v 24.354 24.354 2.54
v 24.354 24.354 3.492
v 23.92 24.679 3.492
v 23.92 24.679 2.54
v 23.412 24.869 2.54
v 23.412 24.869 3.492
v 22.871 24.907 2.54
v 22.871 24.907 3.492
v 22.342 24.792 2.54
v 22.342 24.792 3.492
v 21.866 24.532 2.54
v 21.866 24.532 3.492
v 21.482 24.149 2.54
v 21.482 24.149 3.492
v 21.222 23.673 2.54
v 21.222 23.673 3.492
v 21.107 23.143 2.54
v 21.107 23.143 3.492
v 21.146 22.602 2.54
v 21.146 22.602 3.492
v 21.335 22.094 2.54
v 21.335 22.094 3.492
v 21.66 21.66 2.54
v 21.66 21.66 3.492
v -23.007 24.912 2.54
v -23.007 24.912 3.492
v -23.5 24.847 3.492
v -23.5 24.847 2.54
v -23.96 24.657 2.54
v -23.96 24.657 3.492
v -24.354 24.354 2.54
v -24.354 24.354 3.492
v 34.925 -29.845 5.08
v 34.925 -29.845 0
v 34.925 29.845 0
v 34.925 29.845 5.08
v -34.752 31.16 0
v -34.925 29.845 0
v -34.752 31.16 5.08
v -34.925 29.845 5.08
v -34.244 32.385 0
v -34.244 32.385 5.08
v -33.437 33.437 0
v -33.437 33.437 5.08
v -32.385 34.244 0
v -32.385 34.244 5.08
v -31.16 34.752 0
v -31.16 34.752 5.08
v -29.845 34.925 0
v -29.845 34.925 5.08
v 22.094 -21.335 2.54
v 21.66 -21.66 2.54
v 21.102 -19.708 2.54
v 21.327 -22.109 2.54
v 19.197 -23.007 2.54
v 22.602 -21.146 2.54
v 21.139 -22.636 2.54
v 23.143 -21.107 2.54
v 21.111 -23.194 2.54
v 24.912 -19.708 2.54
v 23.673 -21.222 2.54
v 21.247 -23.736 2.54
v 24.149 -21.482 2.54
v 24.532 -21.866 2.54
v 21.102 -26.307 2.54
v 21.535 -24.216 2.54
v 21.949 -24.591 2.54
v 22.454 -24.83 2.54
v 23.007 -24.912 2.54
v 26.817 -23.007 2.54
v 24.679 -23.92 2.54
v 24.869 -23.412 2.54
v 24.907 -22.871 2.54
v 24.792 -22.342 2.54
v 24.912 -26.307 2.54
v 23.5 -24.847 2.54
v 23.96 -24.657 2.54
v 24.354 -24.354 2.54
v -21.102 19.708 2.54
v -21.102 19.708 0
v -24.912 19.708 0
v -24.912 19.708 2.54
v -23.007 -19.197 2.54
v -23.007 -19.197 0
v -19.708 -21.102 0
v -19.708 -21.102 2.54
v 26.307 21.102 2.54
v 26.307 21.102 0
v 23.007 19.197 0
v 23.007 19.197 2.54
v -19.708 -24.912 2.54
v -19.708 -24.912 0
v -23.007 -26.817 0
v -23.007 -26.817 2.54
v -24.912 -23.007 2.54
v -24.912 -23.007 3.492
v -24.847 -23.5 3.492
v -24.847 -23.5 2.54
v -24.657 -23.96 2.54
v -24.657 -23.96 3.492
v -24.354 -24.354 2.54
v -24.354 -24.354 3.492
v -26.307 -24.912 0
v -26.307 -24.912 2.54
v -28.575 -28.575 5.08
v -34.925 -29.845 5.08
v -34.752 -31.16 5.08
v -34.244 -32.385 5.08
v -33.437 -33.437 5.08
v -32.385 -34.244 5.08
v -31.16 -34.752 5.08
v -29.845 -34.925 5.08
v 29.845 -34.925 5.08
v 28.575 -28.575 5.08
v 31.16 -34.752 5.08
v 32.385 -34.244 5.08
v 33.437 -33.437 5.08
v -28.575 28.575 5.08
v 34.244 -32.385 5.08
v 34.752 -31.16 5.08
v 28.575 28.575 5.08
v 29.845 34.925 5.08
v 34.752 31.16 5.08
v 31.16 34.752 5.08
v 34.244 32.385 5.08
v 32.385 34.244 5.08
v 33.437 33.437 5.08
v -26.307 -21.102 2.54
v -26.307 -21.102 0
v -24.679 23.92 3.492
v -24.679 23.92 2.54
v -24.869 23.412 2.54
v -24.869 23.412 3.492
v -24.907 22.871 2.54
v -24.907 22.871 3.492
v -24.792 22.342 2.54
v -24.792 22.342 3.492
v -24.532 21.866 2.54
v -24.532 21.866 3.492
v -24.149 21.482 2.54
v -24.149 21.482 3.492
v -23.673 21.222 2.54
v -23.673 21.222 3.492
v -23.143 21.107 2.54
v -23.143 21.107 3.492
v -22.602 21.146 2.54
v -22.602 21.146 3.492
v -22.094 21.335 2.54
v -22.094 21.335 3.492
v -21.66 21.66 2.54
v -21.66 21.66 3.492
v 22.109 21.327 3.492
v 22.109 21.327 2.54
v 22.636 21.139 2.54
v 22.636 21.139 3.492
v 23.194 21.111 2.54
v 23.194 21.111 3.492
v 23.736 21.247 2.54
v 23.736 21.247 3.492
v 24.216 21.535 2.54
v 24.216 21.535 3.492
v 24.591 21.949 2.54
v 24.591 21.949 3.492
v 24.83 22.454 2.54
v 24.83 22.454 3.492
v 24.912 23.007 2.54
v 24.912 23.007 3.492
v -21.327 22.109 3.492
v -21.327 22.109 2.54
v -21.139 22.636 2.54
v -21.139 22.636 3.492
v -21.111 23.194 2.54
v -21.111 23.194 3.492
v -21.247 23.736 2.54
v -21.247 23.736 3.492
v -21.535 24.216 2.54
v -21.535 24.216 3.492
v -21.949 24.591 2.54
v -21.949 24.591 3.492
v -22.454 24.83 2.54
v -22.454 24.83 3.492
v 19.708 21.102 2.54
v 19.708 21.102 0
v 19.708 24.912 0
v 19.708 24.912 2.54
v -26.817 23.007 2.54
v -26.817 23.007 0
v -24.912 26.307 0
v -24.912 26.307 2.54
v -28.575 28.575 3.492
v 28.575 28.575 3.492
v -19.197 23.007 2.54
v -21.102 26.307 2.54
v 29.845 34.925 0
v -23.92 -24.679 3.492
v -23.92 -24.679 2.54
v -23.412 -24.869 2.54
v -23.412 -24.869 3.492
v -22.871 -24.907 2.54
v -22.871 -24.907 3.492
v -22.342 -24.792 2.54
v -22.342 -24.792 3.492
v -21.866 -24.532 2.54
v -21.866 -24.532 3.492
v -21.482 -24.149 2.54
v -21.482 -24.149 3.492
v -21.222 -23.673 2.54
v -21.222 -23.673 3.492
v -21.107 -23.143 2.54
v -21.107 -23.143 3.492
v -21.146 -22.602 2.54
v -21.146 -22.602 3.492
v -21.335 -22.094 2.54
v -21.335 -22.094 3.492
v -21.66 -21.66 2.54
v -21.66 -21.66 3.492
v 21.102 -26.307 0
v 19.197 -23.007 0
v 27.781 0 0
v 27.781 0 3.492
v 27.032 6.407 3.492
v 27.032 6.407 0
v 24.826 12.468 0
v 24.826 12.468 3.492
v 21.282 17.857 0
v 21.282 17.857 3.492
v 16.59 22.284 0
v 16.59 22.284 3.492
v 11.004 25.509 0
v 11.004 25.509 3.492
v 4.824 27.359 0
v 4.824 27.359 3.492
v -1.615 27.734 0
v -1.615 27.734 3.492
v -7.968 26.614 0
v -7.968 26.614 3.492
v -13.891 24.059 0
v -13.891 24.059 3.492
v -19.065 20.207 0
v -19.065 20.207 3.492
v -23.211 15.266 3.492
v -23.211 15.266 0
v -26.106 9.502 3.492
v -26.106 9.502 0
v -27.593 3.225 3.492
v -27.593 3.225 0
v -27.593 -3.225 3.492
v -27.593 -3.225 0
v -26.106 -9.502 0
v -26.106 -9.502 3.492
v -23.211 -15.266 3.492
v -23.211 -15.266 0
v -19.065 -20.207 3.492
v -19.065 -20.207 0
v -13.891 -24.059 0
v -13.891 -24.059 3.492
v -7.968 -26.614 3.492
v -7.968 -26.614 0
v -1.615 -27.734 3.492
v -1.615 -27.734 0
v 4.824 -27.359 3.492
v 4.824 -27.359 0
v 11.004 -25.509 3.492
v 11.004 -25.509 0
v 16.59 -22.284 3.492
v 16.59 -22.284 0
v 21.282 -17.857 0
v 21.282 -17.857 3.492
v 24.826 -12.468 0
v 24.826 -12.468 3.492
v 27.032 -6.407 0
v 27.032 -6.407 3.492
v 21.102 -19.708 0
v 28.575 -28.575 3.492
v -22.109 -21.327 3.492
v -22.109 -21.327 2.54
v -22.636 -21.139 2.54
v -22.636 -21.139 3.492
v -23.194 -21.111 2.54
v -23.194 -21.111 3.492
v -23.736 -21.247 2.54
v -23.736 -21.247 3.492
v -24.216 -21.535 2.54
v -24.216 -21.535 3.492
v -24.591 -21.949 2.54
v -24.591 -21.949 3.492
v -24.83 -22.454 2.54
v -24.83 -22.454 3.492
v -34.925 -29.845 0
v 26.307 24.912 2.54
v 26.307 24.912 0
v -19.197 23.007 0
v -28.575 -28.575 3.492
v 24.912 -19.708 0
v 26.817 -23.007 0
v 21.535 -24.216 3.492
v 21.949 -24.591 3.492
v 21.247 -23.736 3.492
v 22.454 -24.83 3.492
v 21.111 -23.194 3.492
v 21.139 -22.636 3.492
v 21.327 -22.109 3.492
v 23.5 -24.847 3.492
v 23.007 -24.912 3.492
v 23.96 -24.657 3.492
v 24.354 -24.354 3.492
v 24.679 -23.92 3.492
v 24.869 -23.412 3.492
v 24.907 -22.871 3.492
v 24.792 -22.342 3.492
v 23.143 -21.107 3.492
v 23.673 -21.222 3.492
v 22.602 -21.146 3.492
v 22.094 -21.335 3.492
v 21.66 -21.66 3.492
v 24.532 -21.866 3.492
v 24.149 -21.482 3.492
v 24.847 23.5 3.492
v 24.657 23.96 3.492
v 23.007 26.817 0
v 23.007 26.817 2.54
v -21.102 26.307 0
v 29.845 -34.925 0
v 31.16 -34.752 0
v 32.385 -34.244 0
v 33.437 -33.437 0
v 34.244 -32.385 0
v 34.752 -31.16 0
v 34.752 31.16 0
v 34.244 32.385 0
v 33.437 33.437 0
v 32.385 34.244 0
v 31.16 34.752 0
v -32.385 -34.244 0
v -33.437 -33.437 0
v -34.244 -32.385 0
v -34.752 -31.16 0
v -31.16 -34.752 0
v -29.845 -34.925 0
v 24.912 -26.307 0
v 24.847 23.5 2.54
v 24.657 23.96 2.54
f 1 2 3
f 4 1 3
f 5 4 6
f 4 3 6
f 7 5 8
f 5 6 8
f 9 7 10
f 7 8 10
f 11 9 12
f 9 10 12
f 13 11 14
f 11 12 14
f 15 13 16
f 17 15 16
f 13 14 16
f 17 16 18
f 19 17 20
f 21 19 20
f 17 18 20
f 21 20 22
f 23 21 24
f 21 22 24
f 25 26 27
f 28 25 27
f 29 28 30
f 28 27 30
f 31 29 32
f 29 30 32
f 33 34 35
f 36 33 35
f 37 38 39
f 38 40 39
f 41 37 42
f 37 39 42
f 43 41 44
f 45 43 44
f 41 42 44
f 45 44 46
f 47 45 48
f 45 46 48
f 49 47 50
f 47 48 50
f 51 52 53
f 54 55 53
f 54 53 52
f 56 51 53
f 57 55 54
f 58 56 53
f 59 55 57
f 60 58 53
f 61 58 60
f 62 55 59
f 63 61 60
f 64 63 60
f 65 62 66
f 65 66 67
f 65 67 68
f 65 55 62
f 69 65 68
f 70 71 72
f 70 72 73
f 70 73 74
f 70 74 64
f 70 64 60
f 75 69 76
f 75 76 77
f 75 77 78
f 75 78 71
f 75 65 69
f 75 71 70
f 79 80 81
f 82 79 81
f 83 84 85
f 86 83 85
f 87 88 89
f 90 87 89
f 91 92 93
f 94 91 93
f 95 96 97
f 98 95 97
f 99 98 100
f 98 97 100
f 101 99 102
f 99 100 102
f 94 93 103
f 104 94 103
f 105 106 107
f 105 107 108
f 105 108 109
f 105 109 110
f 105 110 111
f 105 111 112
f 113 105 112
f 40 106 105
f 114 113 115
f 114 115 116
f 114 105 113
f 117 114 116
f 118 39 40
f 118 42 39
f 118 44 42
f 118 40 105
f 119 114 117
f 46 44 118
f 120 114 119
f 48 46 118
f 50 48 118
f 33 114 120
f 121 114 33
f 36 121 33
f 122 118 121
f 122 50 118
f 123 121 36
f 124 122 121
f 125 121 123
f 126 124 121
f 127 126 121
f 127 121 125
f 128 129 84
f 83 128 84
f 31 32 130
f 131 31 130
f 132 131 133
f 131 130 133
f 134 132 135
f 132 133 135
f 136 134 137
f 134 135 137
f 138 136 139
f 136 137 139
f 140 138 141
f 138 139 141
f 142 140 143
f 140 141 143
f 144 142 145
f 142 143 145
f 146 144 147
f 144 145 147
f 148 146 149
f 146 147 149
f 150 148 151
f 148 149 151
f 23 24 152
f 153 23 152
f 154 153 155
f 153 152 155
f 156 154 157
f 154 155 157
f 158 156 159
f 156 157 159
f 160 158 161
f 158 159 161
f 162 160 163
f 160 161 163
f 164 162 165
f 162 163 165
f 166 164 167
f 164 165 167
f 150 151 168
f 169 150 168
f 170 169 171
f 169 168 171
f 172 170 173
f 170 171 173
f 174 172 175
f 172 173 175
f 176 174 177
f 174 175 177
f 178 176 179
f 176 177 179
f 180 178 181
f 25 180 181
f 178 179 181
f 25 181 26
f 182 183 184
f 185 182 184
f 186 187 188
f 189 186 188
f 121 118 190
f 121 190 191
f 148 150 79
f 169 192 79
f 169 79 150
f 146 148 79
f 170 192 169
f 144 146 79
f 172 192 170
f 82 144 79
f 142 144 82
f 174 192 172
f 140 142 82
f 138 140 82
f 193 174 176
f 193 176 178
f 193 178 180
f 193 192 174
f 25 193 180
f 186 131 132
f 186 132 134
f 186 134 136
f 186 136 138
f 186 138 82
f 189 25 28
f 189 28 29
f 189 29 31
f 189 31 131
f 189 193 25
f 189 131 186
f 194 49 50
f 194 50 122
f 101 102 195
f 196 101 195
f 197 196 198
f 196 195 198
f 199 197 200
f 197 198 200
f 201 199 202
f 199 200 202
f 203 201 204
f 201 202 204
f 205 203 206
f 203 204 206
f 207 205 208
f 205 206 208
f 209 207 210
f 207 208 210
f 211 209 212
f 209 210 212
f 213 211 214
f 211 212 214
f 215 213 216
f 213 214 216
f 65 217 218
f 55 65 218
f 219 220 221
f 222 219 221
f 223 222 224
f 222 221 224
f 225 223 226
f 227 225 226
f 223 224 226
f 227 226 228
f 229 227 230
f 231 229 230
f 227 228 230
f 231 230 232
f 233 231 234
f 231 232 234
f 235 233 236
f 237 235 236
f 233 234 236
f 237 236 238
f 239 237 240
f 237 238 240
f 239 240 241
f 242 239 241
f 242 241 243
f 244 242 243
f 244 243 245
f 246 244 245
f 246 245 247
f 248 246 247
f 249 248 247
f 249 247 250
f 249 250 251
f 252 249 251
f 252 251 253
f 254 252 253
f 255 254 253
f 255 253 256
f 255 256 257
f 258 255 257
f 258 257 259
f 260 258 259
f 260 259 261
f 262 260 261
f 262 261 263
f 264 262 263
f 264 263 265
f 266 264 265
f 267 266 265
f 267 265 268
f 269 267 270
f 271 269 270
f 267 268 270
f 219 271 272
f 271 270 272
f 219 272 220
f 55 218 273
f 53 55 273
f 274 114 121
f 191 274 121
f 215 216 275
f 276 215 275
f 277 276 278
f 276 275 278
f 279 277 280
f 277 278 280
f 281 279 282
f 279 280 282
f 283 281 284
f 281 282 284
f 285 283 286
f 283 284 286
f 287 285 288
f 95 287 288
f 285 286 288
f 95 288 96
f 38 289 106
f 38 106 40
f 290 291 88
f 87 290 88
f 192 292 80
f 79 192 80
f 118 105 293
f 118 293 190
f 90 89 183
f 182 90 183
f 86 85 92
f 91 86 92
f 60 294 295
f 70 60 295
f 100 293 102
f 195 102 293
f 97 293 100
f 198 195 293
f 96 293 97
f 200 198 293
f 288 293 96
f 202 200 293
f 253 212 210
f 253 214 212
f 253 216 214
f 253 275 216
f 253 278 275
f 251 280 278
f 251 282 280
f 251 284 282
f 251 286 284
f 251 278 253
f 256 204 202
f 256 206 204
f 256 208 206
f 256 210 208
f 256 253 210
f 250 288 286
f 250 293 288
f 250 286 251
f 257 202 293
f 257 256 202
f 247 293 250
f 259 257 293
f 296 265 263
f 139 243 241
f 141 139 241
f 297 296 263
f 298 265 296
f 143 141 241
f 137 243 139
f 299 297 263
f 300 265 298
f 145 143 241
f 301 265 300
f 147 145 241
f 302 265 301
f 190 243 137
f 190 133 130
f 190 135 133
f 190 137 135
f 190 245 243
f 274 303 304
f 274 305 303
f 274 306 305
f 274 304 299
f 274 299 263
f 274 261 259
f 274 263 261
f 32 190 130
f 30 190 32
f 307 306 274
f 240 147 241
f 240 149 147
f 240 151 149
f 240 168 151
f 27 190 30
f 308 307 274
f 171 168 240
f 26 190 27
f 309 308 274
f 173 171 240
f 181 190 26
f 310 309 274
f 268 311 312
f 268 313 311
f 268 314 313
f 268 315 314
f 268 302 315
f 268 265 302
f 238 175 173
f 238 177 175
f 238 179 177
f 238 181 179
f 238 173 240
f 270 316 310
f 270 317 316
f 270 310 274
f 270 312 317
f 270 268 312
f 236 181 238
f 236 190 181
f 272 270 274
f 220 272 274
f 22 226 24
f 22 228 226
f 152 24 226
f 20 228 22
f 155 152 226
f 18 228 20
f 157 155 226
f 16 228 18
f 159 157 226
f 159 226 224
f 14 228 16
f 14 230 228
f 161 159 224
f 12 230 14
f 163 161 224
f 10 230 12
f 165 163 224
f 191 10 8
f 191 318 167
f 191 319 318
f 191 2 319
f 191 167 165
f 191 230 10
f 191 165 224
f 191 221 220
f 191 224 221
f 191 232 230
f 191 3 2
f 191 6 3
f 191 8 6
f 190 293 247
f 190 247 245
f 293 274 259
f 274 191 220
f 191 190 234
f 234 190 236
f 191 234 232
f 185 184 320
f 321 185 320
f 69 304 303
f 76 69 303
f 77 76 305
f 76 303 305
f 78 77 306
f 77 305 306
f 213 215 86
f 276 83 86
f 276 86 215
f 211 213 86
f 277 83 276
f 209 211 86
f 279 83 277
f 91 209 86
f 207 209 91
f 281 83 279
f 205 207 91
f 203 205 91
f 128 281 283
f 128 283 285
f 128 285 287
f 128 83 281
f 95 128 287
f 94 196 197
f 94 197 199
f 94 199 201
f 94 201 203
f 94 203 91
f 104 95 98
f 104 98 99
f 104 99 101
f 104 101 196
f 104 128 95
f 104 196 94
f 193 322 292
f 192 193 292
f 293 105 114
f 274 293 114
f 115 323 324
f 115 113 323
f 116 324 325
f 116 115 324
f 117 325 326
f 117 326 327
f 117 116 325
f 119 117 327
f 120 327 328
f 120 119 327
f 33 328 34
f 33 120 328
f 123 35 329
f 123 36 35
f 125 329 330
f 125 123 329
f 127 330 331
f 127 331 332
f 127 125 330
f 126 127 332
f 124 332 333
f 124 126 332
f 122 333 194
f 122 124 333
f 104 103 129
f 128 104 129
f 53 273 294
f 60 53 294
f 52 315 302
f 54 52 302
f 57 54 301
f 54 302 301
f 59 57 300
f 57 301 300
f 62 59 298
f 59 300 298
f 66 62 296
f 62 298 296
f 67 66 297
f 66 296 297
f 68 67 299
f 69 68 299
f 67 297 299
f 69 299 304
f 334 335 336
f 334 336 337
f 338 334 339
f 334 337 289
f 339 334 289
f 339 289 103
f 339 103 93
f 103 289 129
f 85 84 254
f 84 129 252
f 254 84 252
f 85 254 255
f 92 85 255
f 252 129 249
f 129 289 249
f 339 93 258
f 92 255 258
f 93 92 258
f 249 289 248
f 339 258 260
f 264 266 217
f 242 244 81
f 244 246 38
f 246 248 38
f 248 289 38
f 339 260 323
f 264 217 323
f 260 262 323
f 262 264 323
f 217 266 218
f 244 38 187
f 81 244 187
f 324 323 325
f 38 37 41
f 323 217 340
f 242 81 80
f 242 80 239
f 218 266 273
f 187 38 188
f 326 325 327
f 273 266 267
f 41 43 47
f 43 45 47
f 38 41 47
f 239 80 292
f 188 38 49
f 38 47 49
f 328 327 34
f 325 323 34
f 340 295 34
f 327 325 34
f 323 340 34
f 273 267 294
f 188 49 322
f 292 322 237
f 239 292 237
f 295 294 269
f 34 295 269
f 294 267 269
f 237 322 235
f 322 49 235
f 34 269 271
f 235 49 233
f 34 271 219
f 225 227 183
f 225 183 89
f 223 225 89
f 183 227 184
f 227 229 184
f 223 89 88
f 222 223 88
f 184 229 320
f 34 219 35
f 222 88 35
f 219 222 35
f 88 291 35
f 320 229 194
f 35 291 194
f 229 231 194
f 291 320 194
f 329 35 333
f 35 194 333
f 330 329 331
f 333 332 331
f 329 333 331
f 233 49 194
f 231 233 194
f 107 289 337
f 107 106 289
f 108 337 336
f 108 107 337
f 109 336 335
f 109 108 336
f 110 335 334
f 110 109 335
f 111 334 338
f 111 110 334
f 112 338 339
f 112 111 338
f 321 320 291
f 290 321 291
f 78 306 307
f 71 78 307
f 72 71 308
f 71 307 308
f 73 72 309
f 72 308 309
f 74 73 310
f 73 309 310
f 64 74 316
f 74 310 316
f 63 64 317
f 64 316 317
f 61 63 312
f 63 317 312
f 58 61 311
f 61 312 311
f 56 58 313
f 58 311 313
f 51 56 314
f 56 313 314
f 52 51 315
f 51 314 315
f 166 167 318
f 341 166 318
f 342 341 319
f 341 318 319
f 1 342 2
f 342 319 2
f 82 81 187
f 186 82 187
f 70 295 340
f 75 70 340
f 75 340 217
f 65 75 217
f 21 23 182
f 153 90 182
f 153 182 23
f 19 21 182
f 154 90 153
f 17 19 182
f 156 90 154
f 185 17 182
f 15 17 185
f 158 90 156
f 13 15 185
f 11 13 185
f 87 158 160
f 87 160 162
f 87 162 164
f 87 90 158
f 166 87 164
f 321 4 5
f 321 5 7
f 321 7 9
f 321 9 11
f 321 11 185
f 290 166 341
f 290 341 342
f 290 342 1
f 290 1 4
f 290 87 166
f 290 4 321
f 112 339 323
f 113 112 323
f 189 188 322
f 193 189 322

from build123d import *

# Parameters (mm, degrees)
F0_W             = 69.85
F0_H             = 69.85
F1_DEPTH         = 5.08
F2_R             = 5.08
F3_R             = 27.78125
F4_DEPTH         = 5.08
F5_W             = 57.15
F5_H             = 57.15
F6_DEPTH         = 1.5875
F8_DEPTH         = 3.4925
F8_COPIES_COUNT  = 4
F11_DEPTH        = 2.54
F11_COPIES_COUNT = 4


# Not quite as in the source:
# - a pattern or mirror of a feature is missing from the dataset's text; its kind, count and spacing are read off the source's solid


with BuildPart() as f1:
    # F0 (on Top) → F1 (new body)
    with BuildSketch(Plane.XY):
        Rectangle(F0_W, F0_H)
    extrude(amount=F1_DEPTH)

    # F2
    f2_edges = [f1.edges().sort_by_distance(p)[0] for p in [
        (-34.925, -34.925, 2.54),
        (34.925, -34.925, 2.54),
        (34.925, 34.925, 2.54),
        (-34.925, 34.925, 2.54),
    ]]
    fillet(f2_edges, radius=F2_R)

    # F3 (on face) → F4 (cut, through all)
    with BuildSketch(Plane.XY.offset(5.08)):
        Circle(F3_R)
    extrude(amount=-F4_DEPTH, mode=Mode.SUBTRACT)

    # F5 (on face) → F6 (cut)
    with BuildSketch(Plane.XY.offset(5.08)):
        Rectangle(F5_W, F5_H)
    extrude(amount=-F6_DEPTH, mode=Mode.SUBTRACT)

    # F7 (on face) → F8 (cut, through all)
    with BuildSketch(Plane.XY.offset(3.4925)):
        with BuildLine():
            Line((21.6602027868, 21.6602027868), (24.3542796231, 24.3542796231))
            ThreePointArc((24.3542796231, 24.3542796231), (21.6602027868, 24.3542796231), (21.6602027868, 21.6602027868))
        make_face()
        with BuildLine():
            ThreePointArc((24.9122412049, 23.0072412049), (24.7672317144, 23.7362531436), (24.3542796231, 24.3542796231))
            Line((24.3542796231, 24.3542796231), (21.6602027868, 21.6602027868))
            ThreePointArc((21.6602027868, 21.6602027868), (23.7362531436, 21.2472506955), (24.9122412049, 23.0072412049))
        make_face()
    f8 = extrude(amount=-F8_DEPTH, mode=Mode.SUBTRACT)

    # F8_copies: F8 ×4 about axis
    f8_copies_axis = Axis((0, 0, 0), (0, 0, 1))
    for i in range(1, F8_COPIES_COUNT):
        add(f8.rotate(f8_copies_axis, i * 360 / F8_COPIES_COUNT), mode=Mode.SUBTRACT)

    # F10 (on face) → F11 (cut)
    with BuildSketch(Plane(origin=(0, 0, 0), x_dir=(1, 0, 0), z_dir=(0, 0, -1))):
        Polygon((26.8172412049, 23.0072412049), (24.9122412049, 26.3067979934), (21.1022412049, 26.3067979934), (19.1972412049, 23.0072412049), (21.1022412049, 19.7076844165), (24.9122412049, 19.7076844165), align=None)
    f11 = extrude(amount=-F11_DEPTH, mode=Mode.SUBTRACT)

    # F11_copies: F11 ×4 about axis
    f11_copies_axis = Axis((0, 0, 0), (0, 0, 1))
    for i in range(1, F11_COPIES_COUNT):
        add(f11.rotate(f11_copies_axis, i * 360 / F11_COPIES_COUNT), mode=Mode.SUBTRACT)


solid = f1.part
